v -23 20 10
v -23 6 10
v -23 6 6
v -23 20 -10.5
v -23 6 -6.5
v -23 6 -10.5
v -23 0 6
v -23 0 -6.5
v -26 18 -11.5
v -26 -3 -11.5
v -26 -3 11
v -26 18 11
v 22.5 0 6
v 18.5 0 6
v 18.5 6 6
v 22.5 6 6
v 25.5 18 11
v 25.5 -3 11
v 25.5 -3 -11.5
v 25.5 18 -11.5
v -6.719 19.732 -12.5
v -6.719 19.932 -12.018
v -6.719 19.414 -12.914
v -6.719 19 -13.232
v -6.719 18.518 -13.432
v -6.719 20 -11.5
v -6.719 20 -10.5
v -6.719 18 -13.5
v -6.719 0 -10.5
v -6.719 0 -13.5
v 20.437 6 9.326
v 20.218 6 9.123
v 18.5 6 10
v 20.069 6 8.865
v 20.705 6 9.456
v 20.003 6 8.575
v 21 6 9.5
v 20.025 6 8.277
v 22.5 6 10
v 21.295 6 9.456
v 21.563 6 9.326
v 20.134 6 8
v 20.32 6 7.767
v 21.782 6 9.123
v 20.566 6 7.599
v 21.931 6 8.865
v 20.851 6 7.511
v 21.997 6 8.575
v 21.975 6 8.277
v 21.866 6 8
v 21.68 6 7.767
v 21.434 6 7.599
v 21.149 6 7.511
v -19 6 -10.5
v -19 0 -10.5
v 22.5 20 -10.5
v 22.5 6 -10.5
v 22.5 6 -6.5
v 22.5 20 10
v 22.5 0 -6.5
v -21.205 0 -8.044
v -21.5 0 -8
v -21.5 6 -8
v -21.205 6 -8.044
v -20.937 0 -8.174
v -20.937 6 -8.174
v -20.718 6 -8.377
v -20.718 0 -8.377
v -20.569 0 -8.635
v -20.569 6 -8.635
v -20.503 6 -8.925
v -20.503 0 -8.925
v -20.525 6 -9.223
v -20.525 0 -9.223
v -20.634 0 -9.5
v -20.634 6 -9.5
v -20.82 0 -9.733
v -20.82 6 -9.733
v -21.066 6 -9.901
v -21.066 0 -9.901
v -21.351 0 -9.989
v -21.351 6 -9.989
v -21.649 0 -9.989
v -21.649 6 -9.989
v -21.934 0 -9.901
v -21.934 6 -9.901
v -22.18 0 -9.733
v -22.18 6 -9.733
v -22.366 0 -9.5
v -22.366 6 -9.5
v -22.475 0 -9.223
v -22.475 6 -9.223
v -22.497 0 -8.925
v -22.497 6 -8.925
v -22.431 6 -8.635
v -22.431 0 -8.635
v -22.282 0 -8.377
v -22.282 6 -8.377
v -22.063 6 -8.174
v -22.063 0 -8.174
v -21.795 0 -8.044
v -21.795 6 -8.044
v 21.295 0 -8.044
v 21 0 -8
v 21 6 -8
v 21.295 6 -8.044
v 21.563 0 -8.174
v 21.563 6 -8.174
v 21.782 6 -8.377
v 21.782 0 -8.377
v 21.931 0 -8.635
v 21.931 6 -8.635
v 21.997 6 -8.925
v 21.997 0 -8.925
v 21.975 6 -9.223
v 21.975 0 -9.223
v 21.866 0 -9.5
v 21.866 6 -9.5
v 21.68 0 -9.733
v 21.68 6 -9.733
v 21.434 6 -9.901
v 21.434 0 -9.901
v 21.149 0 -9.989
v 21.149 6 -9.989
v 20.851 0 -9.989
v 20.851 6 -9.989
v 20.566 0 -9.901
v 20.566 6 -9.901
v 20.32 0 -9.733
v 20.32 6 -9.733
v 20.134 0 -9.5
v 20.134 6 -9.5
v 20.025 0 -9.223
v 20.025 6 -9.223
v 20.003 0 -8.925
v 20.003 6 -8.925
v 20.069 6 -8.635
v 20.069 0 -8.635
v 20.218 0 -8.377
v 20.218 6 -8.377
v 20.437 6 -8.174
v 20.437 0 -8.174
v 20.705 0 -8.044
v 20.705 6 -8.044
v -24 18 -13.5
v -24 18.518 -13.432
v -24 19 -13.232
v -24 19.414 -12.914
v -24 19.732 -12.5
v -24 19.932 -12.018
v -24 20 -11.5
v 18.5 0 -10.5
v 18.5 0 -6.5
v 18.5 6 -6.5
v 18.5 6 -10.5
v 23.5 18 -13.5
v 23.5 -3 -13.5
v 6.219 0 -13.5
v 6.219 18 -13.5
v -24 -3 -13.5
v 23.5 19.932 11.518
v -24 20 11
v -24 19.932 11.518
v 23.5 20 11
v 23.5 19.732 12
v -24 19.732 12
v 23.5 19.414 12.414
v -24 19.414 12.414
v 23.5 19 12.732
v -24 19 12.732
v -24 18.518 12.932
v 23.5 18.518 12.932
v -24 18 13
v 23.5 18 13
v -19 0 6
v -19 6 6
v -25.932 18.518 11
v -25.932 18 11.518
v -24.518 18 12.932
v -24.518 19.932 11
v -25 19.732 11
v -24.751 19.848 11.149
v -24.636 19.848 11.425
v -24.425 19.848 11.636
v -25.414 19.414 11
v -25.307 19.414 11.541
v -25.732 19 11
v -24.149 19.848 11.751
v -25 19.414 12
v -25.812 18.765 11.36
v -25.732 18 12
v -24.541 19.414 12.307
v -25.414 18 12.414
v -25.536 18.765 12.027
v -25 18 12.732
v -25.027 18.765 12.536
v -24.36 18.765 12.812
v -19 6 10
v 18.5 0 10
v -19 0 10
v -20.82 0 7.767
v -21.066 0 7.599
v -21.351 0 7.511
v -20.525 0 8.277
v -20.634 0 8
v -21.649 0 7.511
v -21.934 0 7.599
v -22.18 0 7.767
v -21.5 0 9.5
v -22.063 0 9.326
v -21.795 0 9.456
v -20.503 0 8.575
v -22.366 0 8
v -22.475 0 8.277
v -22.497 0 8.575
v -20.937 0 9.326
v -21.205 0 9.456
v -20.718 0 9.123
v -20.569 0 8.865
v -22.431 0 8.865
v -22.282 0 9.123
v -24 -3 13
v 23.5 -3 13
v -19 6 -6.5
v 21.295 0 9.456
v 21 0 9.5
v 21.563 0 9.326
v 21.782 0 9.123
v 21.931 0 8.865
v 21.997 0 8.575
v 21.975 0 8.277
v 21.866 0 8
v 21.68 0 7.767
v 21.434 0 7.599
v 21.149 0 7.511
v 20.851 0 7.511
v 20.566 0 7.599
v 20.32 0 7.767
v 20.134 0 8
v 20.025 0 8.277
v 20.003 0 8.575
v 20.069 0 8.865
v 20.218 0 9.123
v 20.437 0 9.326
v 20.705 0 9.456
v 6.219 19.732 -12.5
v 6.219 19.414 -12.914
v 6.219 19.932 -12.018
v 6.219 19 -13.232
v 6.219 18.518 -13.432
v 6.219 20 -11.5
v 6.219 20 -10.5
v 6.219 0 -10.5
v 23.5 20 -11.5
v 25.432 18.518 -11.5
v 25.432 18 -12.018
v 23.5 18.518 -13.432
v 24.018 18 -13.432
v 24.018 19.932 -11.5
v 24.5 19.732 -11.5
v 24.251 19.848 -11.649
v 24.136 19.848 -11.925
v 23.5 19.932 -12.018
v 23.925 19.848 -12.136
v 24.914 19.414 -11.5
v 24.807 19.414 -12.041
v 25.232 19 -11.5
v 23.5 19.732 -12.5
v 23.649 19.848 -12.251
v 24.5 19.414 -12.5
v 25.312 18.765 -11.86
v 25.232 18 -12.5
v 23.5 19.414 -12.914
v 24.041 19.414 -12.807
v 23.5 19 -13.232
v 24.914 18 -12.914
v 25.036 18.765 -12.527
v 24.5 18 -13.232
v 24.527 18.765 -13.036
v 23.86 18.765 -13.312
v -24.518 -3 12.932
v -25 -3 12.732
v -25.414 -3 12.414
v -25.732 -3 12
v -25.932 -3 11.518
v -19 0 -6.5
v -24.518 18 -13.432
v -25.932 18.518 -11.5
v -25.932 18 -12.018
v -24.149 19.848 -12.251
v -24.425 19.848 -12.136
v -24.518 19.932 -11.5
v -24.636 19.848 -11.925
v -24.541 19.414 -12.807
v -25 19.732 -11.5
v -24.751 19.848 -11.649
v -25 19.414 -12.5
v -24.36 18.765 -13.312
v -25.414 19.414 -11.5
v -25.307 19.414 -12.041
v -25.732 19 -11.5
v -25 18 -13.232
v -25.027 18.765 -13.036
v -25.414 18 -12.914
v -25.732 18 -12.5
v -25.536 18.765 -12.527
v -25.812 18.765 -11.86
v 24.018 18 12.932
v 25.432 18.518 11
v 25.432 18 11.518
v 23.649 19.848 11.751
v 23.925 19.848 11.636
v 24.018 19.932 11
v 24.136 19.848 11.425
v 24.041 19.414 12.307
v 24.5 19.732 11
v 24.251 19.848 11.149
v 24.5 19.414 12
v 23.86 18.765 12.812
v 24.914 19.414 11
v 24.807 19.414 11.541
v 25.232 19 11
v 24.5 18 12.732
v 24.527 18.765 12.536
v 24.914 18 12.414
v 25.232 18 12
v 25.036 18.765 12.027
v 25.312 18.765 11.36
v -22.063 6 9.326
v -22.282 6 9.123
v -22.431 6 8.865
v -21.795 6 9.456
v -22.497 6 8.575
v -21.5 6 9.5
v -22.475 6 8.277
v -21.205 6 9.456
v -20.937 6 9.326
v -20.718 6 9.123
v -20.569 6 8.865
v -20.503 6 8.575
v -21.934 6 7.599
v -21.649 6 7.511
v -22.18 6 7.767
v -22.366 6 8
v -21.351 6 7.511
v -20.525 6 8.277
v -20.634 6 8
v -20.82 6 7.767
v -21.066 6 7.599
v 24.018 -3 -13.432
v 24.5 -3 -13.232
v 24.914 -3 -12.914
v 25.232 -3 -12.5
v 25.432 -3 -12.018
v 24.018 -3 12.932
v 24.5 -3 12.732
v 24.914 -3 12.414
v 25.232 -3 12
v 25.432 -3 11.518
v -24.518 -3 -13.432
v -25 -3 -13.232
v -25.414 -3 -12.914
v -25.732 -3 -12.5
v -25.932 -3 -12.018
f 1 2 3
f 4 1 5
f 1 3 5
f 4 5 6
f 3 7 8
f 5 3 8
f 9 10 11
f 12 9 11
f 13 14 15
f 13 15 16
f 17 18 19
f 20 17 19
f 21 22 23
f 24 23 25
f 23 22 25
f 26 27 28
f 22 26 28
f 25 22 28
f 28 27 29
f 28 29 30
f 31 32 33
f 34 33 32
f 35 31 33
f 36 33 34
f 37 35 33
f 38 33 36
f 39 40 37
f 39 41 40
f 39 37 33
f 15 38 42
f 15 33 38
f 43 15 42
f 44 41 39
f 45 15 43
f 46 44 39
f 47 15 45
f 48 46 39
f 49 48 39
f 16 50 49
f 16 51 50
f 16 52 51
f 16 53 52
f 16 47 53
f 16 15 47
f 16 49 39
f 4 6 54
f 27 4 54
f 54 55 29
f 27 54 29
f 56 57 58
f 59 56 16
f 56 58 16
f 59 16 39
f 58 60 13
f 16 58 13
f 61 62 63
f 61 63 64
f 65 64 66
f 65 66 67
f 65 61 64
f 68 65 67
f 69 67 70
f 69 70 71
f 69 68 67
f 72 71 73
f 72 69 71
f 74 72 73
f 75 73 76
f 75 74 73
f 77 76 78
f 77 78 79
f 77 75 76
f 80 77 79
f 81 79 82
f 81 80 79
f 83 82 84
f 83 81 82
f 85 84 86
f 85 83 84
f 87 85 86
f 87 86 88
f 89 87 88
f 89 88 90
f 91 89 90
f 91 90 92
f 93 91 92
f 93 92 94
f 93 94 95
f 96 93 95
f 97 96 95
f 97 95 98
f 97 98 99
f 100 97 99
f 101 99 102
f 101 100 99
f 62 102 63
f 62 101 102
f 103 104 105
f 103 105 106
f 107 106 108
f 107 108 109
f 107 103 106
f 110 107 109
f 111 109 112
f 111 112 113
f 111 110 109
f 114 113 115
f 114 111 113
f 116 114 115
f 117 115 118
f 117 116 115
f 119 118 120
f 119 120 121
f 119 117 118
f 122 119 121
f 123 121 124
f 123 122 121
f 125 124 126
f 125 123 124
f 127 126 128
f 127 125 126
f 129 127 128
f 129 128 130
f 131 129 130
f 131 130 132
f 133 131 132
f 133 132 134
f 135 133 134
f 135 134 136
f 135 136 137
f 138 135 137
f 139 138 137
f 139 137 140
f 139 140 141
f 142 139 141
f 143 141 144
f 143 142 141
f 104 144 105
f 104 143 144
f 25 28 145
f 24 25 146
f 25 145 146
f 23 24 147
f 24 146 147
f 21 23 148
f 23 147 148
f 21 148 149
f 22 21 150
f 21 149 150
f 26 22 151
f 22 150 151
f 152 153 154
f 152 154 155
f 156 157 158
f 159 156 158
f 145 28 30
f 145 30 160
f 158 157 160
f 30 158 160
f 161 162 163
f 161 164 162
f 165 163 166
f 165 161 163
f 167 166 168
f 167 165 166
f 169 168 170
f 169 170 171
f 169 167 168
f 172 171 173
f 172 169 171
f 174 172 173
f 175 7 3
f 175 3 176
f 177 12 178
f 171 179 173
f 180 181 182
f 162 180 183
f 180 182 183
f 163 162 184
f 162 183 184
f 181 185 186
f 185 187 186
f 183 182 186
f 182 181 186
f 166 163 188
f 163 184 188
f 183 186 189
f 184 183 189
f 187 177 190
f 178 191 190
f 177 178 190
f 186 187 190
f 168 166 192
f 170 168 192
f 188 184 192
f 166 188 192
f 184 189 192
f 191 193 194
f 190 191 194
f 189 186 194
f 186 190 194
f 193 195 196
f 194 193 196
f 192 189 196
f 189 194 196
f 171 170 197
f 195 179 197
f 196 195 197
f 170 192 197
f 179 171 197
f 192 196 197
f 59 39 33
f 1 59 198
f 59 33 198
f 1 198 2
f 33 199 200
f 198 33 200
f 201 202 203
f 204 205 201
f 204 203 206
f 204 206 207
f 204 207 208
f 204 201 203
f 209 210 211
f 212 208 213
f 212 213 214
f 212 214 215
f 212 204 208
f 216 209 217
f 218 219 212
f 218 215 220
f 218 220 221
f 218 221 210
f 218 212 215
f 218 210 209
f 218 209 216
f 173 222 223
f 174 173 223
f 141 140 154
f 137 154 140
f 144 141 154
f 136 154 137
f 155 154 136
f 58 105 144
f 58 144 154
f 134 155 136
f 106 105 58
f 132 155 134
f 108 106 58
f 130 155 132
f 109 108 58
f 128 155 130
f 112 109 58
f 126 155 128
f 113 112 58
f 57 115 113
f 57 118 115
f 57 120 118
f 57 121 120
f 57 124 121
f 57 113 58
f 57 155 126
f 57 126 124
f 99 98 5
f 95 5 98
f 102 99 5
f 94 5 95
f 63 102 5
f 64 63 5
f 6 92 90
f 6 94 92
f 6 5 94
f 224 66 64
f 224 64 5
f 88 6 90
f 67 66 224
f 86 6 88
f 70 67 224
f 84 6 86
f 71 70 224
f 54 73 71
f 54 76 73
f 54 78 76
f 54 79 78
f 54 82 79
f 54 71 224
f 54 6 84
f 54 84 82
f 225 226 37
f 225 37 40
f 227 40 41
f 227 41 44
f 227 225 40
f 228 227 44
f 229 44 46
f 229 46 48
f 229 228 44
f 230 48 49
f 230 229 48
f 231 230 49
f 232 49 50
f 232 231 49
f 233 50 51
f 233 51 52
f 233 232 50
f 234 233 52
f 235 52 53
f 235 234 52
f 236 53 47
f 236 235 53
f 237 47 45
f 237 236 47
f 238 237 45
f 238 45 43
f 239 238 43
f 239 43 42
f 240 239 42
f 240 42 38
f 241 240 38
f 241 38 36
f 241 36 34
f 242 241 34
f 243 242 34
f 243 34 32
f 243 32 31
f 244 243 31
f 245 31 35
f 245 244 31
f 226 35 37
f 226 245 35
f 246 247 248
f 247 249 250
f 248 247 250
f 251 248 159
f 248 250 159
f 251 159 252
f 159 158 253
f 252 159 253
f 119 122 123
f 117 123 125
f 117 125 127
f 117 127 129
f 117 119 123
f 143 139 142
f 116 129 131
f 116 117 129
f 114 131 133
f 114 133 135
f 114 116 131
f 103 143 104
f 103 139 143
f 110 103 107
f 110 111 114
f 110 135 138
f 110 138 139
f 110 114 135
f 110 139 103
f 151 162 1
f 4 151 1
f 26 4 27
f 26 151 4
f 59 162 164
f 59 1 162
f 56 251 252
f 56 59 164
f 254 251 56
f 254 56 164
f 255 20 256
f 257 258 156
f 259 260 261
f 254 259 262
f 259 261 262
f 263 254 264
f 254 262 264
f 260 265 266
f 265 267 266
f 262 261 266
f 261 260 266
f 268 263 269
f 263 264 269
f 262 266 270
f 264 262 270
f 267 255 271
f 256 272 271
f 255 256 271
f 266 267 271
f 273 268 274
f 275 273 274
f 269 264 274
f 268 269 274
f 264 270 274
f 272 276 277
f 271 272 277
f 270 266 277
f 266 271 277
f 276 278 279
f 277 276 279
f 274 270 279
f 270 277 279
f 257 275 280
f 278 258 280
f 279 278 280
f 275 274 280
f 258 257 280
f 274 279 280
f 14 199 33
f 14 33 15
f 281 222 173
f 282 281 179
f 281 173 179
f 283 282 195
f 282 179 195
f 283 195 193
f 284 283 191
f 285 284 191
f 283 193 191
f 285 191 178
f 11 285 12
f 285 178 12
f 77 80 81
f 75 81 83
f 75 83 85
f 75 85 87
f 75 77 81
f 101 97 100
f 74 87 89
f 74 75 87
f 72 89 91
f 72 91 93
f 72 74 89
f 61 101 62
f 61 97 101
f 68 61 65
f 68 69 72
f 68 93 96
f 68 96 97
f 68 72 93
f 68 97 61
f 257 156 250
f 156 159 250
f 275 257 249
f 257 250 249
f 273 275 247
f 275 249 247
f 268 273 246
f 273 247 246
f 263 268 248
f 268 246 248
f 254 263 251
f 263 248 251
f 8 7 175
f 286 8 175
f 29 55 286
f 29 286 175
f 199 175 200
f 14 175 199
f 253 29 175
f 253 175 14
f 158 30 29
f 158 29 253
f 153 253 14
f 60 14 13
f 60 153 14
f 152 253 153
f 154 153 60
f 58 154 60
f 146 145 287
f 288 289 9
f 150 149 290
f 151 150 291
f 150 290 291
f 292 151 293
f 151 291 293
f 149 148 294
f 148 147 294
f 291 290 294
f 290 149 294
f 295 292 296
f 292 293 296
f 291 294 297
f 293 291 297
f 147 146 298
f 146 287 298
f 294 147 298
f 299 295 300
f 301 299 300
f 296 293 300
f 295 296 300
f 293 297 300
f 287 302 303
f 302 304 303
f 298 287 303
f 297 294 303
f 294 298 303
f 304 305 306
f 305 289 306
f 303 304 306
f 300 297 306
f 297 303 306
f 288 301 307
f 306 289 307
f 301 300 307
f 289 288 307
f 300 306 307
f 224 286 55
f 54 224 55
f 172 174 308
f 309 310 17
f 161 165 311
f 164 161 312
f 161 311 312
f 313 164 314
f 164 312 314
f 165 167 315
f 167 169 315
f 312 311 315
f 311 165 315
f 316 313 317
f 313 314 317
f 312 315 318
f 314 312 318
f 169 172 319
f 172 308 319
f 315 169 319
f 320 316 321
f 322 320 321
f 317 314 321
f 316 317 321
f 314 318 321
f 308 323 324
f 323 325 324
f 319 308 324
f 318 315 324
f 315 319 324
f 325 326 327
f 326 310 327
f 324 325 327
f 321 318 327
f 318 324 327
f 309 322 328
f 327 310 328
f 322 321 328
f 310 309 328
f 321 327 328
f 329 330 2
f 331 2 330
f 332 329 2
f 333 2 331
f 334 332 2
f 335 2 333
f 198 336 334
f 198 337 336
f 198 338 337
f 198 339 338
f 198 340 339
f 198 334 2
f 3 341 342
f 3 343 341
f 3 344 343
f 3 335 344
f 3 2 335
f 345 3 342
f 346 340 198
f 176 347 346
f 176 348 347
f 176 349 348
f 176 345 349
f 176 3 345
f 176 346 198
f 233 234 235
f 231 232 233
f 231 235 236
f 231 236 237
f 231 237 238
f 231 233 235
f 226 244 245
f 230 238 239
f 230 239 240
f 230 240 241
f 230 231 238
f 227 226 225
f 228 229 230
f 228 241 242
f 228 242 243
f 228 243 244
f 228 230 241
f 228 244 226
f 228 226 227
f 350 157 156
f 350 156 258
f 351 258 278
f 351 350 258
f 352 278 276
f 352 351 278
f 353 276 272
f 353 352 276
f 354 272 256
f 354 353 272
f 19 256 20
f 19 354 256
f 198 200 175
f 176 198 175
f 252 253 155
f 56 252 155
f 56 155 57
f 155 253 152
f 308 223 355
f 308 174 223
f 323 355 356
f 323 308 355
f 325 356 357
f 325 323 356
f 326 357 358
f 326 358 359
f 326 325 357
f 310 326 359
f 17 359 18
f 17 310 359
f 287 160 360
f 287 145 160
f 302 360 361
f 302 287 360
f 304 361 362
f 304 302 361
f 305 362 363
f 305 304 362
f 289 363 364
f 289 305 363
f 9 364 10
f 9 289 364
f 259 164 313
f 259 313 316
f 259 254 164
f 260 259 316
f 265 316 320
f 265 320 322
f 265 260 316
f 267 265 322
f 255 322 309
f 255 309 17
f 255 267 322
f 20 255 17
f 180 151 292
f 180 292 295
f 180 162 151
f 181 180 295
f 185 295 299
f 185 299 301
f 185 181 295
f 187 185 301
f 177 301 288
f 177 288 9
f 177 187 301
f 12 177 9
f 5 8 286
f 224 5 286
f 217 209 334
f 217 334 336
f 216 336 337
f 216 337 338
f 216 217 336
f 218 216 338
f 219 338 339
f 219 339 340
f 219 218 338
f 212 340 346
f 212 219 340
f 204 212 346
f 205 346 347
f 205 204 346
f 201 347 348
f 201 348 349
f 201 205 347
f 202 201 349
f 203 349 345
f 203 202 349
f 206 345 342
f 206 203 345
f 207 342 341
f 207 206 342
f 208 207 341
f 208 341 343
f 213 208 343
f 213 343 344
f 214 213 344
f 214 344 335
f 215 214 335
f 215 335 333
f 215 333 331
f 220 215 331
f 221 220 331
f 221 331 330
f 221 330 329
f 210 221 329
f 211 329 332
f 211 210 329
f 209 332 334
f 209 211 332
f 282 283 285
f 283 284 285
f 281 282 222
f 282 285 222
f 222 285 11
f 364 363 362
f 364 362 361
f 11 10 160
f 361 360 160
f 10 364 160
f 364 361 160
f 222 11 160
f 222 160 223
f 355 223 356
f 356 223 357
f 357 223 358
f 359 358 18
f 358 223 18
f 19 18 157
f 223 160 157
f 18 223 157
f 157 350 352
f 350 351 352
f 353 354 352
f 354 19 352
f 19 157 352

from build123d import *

# Parameters (mm, degrees)
EXTRUDE_1_DEPTH = 20
SKETCH_1_3_W    = 4
SKETCH_1_3_H    = 4
SKETCH_1_3_R    = 1
EXTRUDE_2_DEPTH = 6
SKETCH_1_4_W    = 51.5
SKETCH_1_4_H    = 26.5
EXTRUDE_3_DEPTH = 3
FILLET_1_R      = 2


with BuildPart() as part:
    # Эскиз1 → Бобышка-Вытянуть1 (new body)
    with BuildSketch(Plane(origin=(0, 0, 0), x_dir=(1, 0, 0), z_dir=(0, 1, 0))):
        Polygon((-23, 6.5), (-23, 10.5), (-19, 10.5), (-6.718518259, 10.5), (-6.718518259, 13.5), (-26, 13.5), (-26, -13), (25.5, -13), (25.5, 13.5), (6.218518259, 13.5), (6.218518259, 10.5), (18.5, 10.5), (22.5, 10.5), (22.5, 6.5), (22.5, -6), (22.5, -10), (18.5, -10), (-19, -10), (-23, -10), (-23, -6), align=None)
    extrude(amount=EXTRUDE_1_DEPTH)

    # Эскиз1<3> → Бобышка-Вытянуть2 (add)
    # profile 1 of 4: a face of its own
    with BuildSketch(Plane(origin=(0, 0, 0), x_dir=(1, 0, 0), z_dir=(0, 1, 0))):
        with Locations((-21, 8.5)):
            Rectangle(SKETCH_1_3_W, SKETCH_1_3_H)
        with Locations((-21.5, 9)):
            Circle(SKETCH_1_3_R, mode=Mode.SUBTRACT)
    # profile 2 of 4: a face of its own
    with BuildSketch(Plane(origin=(0, 0, 0), x_dir=(1, 0, 0), z_dir=(0, 1, 0))):
        with Locations((-21, -8)):
            Rectangle(SKETCH_1_3_W, SKETCH_1_3_H)
        with Locations((-21.5, -8.5)):
            Circle(SKETCH_1_3_R, mode=Mode.SUBTRACT)
    # profile 3 of 4: a face of its own
    with BuildSketch(Plane(origin=(0, 0, 0), x_dir=(1, 0, 0), z_dir=(0, 1, 0))):
        with Locations((20.5, 8.5)):
            Rectangle(SKETCH_1_3_W, SKETCH_1_3_H)
        with Locations((21, 9)):
            Circle(SKETCH_1_3_R, mode=Mode.SUBTRACT)
    # profile 4 of 4: a face of its own
    with BuildSketch(Plane(origin=(0, 0, 0), x_dir=(1, 0, 0), z_dir=(0, 1, 0))):
        with Locations((20.5, -8)):
            Rectangle(SKETCH_1_3_W, SKETCH_1_3_H)
        with Locations((21, -8.5)):
            Circle(SKETCH_1_3_R, mode=Mode.SUBTRACT)
    extrude(amount=EXTRUDE_2_DEPTH)

    # Эскиз1<4> → Бобышка-Вытянуть3 (add)
    with BuildSketch(Plane(origin=(0, 0, 0), x_dir=(1, 0, 0), z_dir=(0, 1, 0))):
        with Locations((-0.25, 0.25)):
            Rectangle(SKETCH_1_4_W, SKETCH_1_4_H)
    extrude(amount=-EXTRUDE_3_DEPTH)

    # Скругление1
    fillet_1_edges = [part.edges().sort_by_distance(p)[0] for p in [
        (-26, 20, -0.25),
        (-16.359259129, 20, -13.5),
        (15.859259129, 20, -13.5),
        (25.5, 20, -0.25),
        (-0.25, 20, 13),
        (-26, 8.5, 13),
        (-26, 8.5, -13.5),
        (25.5, 8.5, -13.5),
        (25.5, 8.5, 13),
    ]]
    fillet(fillet_1_edges, radius=FILLET_1_R)


solid = part.part
